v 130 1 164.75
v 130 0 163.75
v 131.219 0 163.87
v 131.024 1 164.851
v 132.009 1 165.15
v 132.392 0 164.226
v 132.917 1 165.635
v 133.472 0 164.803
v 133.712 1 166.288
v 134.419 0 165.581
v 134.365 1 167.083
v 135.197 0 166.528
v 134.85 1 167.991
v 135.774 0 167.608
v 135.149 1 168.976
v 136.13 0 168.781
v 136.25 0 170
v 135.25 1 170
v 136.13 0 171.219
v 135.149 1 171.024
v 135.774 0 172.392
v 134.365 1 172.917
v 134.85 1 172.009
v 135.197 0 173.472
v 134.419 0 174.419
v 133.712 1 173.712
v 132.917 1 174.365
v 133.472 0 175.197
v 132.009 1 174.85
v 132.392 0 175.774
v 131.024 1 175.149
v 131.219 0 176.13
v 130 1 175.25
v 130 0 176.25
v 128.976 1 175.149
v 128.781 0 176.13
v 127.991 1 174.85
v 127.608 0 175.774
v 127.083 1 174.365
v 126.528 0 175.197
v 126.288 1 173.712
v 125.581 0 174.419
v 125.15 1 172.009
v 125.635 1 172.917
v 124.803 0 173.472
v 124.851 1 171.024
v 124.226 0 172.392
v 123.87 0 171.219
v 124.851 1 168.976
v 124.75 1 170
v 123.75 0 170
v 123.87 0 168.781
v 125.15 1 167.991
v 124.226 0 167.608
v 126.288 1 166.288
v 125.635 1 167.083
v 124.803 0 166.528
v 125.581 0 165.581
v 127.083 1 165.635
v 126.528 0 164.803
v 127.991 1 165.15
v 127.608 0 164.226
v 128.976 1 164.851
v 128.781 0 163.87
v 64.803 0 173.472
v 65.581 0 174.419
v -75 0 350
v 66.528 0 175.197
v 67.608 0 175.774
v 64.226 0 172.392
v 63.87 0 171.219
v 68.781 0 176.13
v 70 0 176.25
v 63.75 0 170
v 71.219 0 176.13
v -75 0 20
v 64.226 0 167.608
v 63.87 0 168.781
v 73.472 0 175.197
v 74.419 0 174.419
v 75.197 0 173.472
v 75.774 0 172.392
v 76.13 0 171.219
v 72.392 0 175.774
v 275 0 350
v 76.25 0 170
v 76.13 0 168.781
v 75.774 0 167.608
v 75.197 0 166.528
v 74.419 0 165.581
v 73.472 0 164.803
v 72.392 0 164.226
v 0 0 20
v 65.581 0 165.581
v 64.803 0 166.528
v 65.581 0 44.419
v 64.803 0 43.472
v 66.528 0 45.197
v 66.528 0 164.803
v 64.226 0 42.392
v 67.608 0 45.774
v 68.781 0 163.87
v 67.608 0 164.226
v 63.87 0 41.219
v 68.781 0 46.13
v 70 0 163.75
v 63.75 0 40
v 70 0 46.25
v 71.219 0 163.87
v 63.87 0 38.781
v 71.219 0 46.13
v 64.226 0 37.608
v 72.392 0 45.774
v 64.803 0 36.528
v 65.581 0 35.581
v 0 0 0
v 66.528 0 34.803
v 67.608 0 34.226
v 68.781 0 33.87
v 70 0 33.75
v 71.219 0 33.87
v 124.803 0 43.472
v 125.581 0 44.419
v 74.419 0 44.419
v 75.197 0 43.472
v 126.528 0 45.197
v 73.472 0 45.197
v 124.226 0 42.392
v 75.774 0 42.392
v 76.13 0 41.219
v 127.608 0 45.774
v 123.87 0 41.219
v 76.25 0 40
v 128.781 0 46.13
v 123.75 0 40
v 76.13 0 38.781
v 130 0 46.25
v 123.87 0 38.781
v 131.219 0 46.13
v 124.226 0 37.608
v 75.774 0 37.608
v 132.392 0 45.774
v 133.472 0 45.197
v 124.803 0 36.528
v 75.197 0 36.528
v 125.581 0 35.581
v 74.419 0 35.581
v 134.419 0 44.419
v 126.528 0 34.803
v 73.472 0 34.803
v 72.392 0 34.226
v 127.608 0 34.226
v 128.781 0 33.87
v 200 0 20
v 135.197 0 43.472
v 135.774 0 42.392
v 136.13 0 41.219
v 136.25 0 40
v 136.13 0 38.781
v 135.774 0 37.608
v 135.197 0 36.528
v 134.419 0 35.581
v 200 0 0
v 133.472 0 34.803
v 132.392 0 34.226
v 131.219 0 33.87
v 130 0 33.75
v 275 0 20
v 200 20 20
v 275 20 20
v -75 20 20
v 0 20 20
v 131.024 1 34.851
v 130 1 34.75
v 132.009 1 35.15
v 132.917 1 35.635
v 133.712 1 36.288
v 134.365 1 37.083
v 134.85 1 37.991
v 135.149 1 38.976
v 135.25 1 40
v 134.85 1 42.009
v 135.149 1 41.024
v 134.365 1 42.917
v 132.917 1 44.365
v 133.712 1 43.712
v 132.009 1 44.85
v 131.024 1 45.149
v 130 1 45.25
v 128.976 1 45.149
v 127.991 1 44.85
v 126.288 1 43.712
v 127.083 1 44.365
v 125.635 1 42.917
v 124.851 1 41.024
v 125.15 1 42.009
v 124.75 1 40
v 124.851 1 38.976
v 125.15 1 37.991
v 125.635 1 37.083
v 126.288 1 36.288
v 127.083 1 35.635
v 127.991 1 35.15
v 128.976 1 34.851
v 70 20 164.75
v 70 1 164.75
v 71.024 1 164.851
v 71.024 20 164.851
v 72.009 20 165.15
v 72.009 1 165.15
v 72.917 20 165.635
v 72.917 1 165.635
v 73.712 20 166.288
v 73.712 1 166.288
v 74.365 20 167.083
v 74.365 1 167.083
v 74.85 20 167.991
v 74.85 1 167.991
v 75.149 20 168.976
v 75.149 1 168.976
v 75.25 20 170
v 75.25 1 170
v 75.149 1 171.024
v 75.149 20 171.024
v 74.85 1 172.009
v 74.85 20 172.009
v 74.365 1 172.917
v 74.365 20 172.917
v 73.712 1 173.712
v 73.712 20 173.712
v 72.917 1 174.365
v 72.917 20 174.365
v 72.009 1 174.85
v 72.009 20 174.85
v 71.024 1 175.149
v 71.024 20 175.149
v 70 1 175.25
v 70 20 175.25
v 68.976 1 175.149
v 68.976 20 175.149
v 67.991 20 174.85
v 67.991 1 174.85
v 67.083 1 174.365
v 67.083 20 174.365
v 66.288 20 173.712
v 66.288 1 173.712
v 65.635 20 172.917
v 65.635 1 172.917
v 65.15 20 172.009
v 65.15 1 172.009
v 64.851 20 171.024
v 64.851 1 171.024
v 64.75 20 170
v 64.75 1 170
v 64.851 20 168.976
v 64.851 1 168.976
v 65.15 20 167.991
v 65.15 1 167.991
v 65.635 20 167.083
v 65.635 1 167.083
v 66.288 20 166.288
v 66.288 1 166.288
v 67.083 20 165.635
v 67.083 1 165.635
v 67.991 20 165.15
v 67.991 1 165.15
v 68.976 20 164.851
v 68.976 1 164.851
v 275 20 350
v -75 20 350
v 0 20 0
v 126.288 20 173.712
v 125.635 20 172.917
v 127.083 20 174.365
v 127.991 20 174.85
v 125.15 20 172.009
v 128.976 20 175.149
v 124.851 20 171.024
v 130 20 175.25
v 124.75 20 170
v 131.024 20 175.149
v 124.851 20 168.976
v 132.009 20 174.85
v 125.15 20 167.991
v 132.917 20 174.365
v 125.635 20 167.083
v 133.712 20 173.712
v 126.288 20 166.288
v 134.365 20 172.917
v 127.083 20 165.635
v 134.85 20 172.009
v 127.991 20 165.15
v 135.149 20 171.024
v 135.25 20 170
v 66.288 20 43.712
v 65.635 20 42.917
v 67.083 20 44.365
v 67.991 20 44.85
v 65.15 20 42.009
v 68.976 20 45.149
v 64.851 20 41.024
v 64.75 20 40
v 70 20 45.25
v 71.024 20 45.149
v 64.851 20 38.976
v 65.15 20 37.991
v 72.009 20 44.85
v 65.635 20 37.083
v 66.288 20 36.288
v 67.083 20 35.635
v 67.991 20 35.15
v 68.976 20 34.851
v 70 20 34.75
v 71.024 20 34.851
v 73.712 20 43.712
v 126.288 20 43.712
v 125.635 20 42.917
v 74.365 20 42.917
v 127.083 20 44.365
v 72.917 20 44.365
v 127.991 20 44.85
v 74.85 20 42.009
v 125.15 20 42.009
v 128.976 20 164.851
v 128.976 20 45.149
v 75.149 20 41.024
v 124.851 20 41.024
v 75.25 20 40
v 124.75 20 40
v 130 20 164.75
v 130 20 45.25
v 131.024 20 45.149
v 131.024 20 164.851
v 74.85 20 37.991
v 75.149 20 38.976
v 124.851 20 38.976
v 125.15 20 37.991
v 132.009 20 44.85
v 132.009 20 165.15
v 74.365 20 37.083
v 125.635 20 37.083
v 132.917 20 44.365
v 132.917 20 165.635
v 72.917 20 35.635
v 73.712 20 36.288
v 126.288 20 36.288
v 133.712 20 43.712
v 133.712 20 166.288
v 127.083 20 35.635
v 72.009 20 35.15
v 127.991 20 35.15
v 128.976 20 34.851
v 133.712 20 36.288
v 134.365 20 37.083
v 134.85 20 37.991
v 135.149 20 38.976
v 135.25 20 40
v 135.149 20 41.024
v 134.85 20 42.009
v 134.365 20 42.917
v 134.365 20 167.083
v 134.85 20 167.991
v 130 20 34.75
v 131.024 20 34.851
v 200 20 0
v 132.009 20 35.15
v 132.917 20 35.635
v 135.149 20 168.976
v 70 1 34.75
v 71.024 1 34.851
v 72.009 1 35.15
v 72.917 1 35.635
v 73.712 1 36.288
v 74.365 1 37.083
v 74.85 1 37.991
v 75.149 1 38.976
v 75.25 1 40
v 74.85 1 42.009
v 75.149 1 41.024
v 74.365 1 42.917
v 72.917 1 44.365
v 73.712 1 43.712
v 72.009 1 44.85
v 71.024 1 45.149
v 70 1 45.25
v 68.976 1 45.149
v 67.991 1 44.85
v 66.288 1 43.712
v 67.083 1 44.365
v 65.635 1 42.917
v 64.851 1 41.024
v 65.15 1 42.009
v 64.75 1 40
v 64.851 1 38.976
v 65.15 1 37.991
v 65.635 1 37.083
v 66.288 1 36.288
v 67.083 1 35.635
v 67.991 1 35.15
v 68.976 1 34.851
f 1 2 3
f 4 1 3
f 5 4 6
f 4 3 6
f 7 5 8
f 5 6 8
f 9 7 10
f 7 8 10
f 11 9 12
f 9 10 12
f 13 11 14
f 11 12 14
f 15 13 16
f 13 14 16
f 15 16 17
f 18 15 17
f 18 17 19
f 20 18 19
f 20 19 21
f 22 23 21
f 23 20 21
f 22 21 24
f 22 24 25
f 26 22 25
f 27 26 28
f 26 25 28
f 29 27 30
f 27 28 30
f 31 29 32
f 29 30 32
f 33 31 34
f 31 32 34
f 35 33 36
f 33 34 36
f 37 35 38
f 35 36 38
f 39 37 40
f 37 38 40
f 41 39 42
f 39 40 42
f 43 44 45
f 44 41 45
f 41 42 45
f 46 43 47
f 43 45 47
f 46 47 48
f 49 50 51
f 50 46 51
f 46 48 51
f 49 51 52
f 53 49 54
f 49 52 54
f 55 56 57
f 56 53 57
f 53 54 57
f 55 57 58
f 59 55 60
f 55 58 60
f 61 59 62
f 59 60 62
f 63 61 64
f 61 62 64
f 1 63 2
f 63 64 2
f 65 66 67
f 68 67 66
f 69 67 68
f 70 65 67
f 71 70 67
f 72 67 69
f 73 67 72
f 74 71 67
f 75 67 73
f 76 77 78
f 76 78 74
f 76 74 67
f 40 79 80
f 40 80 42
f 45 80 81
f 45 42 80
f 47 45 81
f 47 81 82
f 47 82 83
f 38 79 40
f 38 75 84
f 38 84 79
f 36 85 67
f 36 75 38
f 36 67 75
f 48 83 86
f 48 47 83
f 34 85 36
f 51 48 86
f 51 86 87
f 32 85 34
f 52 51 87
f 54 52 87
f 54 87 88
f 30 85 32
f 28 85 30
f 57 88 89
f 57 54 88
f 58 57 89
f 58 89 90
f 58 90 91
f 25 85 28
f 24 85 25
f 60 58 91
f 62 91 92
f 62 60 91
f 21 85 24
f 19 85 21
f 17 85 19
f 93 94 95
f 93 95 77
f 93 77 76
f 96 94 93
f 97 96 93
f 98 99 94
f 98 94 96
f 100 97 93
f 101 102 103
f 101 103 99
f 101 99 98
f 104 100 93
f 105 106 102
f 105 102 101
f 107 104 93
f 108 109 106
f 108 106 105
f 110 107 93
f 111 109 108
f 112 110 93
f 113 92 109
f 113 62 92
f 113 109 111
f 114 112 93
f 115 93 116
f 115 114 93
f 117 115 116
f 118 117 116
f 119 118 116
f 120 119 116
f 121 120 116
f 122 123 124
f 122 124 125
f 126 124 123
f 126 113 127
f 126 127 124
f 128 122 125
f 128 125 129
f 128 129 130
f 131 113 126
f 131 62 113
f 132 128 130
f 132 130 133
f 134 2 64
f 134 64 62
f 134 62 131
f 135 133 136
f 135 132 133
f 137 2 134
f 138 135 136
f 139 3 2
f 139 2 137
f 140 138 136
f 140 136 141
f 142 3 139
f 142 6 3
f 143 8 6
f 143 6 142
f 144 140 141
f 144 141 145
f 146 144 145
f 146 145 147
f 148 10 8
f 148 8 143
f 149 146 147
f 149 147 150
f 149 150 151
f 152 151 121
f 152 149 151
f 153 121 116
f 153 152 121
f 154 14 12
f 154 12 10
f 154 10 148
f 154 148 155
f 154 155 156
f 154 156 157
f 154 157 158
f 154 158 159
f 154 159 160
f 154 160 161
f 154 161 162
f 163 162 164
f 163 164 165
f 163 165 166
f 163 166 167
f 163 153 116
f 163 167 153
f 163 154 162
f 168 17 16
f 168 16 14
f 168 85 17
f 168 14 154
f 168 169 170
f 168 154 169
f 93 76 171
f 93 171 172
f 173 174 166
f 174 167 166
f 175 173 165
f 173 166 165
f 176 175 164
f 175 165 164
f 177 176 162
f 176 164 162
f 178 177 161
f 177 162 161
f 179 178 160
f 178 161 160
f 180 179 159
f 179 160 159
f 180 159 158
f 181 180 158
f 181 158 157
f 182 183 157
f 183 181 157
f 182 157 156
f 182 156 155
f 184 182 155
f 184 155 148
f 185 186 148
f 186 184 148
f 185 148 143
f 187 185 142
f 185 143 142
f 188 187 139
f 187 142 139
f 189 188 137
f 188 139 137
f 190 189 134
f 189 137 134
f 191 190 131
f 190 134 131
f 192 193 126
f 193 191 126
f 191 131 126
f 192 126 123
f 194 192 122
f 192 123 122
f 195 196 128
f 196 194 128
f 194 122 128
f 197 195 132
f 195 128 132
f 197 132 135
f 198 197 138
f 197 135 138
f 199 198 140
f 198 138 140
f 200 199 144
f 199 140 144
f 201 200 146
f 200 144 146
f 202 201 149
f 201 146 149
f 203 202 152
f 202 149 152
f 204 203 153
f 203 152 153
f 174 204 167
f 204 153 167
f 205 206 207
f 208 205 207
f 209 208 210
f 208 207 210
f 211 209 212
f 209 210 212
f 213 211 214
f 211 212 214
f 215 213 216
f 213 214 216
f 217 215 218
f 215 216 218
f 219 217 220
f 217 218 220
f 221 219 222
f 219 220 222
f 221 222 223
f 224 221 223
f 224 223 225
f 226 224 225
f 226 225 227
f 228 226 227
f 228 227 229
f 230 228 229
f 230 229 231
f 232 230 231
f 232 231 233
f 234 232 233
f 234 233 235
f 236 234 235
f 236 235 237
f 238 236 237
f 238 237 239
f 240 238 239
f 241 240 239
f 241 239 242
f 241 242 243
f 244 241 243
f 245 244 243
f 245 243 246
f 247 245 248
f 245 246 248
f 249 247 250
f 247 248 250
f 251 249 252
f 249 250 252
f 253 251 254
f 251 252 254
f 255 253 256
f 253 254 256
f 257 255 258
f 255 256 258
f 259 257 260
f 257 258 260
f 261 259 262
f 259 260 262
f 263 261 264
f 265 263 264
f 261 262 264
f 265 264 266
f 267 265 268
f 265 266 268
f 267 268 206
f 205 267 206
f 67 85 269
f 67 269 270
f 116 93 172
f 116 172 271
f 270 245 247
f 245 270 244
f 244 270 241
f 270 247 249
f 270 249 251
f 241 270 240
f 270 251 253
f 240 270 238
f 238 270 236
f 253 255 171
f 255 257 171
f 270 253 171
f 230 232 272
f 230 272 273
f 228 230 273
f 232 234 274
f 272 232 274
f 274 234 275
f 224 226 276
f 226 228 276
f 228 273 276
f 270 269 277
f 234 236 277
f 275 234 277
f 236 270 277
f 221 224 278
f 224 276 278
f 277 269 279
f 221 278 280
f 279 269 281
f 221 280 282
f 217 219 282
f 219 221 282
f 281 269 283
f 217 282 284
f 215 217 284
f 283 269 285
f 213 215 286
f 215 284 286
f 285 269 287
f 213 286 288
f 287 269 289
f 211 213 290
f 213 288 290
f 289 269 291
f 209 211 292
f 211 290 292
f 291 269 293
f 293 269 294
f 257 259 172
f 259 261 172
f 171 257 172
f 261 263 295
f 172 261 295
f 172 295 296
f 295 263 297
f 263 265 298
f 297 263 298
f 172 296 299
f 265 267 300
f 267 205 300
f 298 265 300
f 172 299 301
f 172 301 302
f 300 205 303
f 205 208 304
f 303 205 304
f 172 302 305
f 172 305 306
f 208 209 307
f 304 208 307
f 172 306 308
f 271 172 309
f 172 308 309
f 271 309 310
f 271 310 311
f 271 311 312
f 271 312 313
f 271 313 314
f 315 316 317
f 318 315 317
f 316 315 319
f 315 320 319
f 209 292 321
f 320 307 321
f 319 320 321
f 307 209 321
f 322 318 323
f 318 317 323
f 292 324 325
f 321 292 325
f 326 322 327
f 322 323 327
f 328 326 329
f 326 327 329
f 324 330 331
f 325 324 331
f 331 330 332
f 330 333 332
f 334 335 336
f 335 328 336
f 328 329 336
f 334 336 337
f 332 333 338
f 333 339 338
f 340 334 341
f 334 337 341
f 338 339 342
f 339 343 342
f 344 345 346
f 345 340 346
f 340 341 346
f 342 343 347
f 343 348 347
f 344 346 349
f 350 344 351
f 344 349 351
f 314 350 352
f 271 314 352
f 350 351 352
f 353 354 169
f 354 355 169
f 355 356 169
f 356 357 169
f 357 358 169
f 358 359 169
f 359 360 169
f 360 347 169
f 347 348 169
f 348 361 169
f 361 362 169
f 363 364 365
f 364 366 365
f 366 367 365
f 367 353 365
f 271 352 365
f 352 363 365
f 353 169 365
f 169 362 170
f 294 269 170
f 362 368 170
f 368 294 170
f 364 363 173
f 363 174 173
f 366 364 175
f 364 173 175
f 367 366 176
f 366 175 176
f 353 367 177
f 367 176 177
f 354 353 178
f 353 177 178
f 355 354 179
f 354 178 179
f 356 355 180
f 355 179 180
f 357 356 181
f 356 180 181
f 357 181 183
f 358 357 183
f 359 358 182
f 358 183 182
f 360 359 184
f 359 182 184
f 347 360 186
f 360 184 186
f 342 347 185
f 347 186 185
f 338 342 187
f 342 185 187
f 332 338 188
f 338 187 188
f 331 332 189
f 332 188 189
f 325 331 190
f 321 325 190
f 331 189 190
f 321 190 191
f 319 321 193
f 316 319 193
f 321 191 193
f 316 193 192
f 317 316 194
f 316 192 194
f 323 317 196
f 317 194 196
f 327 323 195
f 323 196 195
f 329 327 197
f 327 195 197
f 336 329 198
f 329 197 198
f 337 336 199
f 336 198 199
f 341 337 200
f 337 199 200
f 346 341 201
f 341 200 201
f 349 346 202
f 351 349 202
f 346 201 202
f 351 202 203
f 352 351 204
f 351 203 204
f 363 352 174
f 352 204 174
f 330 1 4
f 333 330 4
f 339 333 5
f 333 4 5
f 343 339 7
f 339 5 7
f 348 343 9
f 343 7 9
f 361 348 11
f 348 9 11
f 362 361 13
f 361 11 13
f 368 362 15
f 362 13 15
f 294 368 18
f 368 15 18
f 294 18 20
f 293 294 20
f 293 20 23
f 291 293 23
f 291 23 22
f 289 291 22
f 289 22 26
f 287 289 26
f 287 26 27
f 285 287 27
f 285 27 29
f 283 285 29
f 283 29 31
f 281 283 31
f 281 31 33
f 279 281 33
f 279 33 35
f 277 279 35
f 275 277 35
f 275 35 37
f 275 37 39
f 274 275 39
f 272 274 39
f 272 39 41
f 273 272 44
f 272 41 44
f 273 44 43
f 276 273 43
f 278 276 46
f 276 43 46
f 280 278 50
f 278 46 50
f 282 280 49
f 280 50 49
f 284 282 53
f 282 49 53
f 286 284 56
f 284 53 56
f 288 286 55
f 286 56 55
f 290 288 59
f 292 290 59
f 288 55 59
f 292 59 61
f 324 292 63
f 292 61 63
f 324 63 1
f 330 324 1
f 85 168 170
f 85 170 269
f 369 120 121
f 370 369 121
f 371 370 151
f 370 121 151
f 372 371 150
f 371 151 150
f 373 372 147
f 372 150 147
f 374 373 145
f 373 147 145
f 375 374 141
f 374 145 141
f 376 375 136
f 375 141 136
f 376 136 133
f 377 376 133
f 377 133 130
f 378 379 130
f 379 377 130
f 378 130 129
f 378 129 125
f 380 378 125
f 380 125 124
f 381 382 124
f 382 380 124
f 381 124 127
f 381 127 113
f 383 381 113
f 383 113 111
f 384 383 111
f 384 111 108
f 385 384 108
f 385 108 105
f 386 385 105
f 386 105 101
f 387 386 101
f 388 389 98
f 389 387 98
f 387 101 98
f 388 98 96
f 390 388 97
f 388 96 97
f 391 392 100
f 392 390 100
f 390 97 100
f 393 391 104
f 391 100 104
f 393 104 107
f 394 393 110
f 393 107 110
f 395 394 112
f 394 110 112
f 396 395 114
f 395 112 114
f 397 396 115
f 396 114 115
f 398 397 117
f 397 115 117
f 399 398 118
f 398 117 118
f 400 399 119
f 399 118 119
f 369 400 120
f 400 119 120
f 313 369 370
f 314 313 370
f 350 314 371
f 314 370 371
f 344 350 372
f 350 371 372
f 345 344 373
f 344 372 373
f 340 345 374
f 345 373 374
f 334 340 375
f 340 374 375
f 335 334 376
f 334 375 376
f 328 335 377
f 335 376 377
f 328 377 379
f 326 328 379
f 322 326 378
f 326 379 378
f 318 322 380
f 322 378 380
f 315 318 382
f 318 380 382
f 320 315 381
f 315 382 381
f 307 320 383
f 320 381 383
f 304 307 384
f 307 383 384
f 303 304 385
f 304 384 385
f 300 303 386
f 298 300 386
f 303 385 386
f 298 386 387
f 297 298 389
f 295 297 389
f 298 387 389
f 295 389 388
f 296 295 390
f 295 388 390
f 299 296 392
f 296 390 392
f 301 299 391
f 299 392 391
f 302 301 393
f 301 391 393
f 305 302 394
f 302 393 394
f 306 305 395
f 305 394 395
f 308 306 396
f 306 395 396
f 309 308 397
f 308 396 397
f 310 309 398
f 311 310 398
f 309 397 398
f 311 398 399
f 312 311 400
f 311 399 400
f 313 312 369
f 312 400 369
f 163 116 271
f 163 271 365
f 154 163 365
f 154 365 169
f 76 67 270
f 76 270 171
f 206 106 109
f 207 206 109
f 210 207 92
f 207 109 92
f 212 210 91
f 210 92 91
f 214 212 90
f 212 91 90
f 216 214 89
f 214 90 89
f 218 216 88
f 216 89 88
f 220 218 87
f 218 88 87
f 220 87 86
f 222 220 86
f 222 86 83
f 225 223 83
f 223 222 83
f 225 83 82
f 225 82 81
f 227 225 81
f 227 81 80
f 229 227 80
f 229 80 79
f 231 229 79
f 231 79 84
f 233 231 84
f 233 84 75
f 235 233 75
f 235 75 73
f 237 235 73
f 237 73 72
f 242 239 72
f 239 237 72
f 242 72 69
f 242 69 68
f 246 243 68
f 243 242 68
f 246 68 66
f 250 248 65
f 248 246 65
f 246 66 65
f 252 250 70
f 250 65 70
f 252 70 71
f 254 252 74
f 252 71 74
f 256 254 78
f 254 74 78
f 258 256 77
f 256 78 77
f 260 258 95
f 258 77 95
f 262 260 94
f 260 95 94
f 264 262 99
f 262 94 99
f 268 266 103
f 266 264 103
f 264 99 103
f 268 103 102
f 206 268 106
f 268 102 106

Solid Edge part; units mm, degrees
sketch "Sketch1" plane through (0, 0, 0) normal (0, -1, 0) x (1, 0, 0)
  line L0 (275, 20) -> (275, 350)
  line L1 (275, 350) -> (-75, 350)
  line L2 (-75, 350) -> (-75, 20)
  line L3 (-75, 20) -> (0, 20)
  line L4 (0, 20) -> (0, 0)
  line L5 (0, 0) -> (200, 0)
  line L6 (200, 0) -> (200, 20)
  line L7 (200, 20) -> (275, 20)
extrude "Protrusion1" add sketch "Sketch1" against normal blind 20
hole "Bohrung_1" at (70, 0, 40) direction (0, 1, 0) diameter 10.5 end up to next start chamfer 1 start chamfer angle 45
hole "Hole1" at (130, 0, 40) direction (0, 1, 0) diameter 10.5 end up to next start chamfer 1 start chamfer angle 45
hole "Hole2" at (130, 0, 170) direction (0, 1, 0) diameter 10.5 end up to next start chamfer 1 start chamfer angle 45
hole "Hole3" at (70, 0, 170) direction (0, 1, 0) diameter 10.5 end up to next start chamfer 1 start chamfer angle 45
